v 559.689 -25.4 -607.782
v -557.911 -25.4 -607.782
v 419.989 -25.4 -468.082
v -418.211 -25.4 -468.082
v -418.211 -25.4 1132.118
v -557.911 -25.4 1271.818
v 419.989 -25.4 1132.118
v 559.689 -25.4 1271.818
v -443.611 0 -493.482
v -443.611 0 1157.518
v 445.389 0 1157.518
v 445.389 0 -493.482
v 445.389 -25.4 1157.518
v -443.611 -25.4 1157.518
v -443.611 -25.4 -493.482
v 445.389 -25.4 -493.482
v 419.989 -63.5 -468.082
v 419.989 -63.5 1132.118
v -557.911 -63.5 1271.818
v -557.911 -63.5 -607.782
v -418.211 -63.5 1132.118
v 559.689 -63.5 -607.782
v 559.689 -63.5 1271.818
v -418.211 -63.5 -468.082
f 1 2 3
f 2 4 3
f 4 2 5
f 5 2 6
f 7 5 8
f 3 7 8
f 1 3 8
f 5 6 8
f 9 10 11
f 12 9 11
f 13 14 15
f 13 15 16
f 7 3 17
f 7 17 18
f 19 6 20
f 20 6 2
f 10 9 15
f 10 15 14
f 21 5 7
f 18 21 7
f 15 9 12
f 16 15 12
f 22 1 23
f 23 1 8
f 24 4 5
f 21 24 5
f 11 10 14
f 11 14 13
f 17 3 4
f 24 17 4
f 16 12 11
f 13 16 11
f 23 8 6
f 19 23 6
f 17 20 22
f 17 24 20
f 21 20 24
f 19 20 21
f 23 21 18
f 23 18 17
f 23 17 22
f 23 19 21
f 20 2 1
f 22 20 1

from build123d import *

# Parameters (mm, degrees)
F0_W     = 889
F0_H     = 1651
F1_DEPTH = 25.4
F2_W     = 139.7
F2_H     = 1600.2
F3_DEPTH = 38.1


with BuildPart() as f1:
    # F0 (on Front) → F1 (new body)
    with BuildSketch(Plane.XZ):
        with Locations((0.889, 332.017954)):
            Rectangle(F0_W, F0_H)
    extrude(amount=F1_DEPTH)


with BuildPart() as f3:
    # F2 (on face) → F3 (new body)
    with BuildSketch(Plane.XZ.offset(25.4)):
        with Locations((-488.061, 332.017954)):
            Rectangle(F2_W, F2_H)
        Polygon((-418.211, -468.082046), (-557.911, -468.082046), (-557.911, -607.782046), (559.689, -607.782046), (559.689, -468.082046), (419.989, -468.082046), align=None)
        Polygon((-557.911, 1271.817954), (-557.911, 1132.117954), (-418.211, 1132.117954), (419.989, 1132.117954), (559.689, 1132.117954), (559.689, 1271.817954), align=None)
        with Locations((489.839, 332.017954)):
            Rectangle(F2_W, F2_H)
    extrude(amount=F3_DEPTH)


solid = Compound([f1.part, f3.part])
